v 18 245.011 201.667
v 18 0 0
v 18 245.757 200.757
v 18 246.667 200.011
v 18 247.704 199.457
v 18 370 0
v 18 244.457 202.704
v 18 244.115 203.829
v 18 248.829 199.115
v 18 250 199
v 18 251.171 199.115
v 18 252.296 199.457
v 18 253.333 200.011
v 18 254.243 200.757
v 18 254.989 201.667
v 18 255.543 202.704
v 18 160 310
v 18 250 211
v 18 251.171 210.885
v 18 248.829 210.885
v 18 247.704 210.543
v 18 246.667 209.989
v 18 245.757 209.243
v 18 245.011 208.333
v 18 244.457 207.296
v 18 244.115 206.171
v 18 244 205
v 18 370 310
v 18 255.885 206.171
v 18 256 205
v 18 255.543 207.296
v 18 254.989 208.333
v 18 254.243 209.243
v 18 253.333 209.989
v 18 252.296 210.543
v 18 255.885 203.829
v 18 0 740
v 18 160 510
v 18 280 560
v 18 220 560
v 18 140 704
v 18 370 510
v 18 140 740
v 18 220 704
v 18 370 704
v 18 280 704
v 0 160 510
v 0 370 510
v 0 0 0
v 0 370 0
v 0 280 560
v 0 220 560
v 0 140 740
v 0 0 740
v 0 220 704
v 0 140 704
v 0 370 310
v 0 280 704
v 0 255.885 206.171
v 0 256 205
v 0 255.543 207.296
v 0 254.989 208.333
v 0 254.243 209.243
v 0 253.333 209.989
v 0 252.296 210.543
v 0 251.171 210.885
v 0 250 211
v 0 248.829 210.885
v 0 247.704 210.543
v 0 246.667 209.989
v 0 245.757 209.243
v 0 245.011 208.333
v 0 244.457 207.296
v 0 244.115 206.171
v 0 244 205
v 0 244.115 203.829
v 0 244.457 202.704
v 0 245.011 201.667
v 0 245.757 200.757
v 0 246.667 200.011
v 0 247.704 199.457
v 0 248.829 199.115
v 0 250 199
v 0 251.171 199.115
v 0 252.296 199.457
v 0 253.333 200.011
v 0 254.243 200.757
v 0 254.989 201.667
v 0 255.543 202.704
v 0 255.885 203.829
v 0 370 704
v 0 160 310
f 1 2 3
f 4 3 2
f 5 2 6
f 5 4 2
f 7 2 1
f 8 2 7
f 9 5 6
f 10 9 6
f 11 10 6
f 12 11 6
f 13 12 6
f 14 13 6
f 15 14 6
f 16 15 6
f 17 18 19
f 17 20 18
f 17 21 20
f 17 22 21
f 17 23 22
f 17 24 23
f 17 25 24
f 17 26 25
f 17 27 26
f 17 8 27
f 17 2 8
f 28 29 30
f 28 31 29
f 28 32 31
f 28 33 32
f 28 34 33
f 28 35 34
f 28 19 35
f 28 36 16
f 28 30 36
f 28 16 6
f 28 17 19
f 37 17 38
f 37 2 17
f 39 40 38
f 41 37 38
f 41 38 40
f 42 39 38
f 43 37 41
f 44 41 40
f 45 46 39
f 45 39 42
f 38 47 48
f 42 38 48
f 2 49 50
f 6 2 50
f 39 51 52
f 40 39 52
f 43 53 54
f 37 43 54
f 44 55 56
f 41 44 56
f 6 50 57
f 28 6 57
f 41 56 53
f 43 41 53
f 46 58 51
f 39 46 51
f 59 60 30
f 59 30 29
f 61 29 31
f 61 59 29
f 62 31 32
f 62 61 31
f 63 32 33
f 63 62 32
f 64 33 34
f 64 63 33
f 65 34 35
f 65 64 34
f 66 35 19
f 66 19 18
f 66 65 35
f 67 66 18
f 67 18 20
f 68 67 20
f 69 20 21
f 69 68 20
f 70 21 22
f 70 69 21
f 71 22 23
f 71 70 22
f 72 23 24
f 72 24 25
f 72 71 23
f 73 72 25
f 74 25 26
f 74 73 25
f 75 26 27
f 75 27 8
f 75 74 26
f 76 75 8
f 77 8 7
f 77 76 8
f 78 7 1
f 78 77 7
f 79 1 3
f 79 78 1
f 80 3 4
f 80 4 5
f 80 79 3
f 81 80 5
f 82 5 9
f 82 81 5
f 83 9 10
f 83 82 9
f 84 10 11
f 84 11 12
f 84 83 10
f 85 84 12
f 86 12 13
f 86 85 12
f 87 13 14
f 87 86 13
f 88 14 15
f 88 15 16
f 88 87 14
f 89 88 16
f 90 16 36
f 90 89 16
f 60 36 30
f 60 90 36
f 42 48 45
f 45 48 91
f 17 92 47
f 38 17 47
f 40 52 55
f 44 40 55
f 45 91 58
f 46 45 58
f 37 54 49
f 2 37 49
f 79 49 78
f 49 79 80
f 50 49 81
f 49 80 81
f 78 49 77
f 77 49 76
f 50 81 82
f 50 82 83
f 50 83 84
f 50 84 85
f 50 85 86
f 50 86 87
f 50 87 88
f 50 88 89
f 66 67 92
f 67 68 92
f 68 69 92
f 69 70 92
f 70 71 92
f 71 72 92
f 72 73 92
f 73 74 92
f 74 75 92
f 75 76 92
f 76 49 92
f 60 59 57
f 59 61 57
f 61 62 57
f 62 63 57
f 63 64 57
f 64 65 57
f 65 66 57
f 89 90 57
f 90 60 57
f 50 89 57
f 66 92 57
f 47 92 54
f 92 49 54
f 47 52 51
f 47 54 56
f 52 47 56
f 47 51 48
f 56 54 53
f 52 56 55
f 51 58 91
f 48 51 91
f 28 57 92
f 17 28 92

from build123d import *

# Parameters (mm, degrees)
F0_R     = 6
F1_DEPTH = 18


with BuildPart() as f1:
    # F0 (on Right) → F1 (new body)
    with BuildSketch(Plane.YZ):
        Polygon((0, 740), (0, 0), (370, 0), (370, 310), (160, 310), (160, 510), (370, 510), (370, 704), (280, 704), (280, 560), (220, 560), (220, 704), (140, 704), (140, 740), align=None)
        with Locations((250, 205)):
            Circle(F0_R, mode=Mode.SUBTRACT)
    extrude(amount=F1_DEPTH)


solid = f1.part
